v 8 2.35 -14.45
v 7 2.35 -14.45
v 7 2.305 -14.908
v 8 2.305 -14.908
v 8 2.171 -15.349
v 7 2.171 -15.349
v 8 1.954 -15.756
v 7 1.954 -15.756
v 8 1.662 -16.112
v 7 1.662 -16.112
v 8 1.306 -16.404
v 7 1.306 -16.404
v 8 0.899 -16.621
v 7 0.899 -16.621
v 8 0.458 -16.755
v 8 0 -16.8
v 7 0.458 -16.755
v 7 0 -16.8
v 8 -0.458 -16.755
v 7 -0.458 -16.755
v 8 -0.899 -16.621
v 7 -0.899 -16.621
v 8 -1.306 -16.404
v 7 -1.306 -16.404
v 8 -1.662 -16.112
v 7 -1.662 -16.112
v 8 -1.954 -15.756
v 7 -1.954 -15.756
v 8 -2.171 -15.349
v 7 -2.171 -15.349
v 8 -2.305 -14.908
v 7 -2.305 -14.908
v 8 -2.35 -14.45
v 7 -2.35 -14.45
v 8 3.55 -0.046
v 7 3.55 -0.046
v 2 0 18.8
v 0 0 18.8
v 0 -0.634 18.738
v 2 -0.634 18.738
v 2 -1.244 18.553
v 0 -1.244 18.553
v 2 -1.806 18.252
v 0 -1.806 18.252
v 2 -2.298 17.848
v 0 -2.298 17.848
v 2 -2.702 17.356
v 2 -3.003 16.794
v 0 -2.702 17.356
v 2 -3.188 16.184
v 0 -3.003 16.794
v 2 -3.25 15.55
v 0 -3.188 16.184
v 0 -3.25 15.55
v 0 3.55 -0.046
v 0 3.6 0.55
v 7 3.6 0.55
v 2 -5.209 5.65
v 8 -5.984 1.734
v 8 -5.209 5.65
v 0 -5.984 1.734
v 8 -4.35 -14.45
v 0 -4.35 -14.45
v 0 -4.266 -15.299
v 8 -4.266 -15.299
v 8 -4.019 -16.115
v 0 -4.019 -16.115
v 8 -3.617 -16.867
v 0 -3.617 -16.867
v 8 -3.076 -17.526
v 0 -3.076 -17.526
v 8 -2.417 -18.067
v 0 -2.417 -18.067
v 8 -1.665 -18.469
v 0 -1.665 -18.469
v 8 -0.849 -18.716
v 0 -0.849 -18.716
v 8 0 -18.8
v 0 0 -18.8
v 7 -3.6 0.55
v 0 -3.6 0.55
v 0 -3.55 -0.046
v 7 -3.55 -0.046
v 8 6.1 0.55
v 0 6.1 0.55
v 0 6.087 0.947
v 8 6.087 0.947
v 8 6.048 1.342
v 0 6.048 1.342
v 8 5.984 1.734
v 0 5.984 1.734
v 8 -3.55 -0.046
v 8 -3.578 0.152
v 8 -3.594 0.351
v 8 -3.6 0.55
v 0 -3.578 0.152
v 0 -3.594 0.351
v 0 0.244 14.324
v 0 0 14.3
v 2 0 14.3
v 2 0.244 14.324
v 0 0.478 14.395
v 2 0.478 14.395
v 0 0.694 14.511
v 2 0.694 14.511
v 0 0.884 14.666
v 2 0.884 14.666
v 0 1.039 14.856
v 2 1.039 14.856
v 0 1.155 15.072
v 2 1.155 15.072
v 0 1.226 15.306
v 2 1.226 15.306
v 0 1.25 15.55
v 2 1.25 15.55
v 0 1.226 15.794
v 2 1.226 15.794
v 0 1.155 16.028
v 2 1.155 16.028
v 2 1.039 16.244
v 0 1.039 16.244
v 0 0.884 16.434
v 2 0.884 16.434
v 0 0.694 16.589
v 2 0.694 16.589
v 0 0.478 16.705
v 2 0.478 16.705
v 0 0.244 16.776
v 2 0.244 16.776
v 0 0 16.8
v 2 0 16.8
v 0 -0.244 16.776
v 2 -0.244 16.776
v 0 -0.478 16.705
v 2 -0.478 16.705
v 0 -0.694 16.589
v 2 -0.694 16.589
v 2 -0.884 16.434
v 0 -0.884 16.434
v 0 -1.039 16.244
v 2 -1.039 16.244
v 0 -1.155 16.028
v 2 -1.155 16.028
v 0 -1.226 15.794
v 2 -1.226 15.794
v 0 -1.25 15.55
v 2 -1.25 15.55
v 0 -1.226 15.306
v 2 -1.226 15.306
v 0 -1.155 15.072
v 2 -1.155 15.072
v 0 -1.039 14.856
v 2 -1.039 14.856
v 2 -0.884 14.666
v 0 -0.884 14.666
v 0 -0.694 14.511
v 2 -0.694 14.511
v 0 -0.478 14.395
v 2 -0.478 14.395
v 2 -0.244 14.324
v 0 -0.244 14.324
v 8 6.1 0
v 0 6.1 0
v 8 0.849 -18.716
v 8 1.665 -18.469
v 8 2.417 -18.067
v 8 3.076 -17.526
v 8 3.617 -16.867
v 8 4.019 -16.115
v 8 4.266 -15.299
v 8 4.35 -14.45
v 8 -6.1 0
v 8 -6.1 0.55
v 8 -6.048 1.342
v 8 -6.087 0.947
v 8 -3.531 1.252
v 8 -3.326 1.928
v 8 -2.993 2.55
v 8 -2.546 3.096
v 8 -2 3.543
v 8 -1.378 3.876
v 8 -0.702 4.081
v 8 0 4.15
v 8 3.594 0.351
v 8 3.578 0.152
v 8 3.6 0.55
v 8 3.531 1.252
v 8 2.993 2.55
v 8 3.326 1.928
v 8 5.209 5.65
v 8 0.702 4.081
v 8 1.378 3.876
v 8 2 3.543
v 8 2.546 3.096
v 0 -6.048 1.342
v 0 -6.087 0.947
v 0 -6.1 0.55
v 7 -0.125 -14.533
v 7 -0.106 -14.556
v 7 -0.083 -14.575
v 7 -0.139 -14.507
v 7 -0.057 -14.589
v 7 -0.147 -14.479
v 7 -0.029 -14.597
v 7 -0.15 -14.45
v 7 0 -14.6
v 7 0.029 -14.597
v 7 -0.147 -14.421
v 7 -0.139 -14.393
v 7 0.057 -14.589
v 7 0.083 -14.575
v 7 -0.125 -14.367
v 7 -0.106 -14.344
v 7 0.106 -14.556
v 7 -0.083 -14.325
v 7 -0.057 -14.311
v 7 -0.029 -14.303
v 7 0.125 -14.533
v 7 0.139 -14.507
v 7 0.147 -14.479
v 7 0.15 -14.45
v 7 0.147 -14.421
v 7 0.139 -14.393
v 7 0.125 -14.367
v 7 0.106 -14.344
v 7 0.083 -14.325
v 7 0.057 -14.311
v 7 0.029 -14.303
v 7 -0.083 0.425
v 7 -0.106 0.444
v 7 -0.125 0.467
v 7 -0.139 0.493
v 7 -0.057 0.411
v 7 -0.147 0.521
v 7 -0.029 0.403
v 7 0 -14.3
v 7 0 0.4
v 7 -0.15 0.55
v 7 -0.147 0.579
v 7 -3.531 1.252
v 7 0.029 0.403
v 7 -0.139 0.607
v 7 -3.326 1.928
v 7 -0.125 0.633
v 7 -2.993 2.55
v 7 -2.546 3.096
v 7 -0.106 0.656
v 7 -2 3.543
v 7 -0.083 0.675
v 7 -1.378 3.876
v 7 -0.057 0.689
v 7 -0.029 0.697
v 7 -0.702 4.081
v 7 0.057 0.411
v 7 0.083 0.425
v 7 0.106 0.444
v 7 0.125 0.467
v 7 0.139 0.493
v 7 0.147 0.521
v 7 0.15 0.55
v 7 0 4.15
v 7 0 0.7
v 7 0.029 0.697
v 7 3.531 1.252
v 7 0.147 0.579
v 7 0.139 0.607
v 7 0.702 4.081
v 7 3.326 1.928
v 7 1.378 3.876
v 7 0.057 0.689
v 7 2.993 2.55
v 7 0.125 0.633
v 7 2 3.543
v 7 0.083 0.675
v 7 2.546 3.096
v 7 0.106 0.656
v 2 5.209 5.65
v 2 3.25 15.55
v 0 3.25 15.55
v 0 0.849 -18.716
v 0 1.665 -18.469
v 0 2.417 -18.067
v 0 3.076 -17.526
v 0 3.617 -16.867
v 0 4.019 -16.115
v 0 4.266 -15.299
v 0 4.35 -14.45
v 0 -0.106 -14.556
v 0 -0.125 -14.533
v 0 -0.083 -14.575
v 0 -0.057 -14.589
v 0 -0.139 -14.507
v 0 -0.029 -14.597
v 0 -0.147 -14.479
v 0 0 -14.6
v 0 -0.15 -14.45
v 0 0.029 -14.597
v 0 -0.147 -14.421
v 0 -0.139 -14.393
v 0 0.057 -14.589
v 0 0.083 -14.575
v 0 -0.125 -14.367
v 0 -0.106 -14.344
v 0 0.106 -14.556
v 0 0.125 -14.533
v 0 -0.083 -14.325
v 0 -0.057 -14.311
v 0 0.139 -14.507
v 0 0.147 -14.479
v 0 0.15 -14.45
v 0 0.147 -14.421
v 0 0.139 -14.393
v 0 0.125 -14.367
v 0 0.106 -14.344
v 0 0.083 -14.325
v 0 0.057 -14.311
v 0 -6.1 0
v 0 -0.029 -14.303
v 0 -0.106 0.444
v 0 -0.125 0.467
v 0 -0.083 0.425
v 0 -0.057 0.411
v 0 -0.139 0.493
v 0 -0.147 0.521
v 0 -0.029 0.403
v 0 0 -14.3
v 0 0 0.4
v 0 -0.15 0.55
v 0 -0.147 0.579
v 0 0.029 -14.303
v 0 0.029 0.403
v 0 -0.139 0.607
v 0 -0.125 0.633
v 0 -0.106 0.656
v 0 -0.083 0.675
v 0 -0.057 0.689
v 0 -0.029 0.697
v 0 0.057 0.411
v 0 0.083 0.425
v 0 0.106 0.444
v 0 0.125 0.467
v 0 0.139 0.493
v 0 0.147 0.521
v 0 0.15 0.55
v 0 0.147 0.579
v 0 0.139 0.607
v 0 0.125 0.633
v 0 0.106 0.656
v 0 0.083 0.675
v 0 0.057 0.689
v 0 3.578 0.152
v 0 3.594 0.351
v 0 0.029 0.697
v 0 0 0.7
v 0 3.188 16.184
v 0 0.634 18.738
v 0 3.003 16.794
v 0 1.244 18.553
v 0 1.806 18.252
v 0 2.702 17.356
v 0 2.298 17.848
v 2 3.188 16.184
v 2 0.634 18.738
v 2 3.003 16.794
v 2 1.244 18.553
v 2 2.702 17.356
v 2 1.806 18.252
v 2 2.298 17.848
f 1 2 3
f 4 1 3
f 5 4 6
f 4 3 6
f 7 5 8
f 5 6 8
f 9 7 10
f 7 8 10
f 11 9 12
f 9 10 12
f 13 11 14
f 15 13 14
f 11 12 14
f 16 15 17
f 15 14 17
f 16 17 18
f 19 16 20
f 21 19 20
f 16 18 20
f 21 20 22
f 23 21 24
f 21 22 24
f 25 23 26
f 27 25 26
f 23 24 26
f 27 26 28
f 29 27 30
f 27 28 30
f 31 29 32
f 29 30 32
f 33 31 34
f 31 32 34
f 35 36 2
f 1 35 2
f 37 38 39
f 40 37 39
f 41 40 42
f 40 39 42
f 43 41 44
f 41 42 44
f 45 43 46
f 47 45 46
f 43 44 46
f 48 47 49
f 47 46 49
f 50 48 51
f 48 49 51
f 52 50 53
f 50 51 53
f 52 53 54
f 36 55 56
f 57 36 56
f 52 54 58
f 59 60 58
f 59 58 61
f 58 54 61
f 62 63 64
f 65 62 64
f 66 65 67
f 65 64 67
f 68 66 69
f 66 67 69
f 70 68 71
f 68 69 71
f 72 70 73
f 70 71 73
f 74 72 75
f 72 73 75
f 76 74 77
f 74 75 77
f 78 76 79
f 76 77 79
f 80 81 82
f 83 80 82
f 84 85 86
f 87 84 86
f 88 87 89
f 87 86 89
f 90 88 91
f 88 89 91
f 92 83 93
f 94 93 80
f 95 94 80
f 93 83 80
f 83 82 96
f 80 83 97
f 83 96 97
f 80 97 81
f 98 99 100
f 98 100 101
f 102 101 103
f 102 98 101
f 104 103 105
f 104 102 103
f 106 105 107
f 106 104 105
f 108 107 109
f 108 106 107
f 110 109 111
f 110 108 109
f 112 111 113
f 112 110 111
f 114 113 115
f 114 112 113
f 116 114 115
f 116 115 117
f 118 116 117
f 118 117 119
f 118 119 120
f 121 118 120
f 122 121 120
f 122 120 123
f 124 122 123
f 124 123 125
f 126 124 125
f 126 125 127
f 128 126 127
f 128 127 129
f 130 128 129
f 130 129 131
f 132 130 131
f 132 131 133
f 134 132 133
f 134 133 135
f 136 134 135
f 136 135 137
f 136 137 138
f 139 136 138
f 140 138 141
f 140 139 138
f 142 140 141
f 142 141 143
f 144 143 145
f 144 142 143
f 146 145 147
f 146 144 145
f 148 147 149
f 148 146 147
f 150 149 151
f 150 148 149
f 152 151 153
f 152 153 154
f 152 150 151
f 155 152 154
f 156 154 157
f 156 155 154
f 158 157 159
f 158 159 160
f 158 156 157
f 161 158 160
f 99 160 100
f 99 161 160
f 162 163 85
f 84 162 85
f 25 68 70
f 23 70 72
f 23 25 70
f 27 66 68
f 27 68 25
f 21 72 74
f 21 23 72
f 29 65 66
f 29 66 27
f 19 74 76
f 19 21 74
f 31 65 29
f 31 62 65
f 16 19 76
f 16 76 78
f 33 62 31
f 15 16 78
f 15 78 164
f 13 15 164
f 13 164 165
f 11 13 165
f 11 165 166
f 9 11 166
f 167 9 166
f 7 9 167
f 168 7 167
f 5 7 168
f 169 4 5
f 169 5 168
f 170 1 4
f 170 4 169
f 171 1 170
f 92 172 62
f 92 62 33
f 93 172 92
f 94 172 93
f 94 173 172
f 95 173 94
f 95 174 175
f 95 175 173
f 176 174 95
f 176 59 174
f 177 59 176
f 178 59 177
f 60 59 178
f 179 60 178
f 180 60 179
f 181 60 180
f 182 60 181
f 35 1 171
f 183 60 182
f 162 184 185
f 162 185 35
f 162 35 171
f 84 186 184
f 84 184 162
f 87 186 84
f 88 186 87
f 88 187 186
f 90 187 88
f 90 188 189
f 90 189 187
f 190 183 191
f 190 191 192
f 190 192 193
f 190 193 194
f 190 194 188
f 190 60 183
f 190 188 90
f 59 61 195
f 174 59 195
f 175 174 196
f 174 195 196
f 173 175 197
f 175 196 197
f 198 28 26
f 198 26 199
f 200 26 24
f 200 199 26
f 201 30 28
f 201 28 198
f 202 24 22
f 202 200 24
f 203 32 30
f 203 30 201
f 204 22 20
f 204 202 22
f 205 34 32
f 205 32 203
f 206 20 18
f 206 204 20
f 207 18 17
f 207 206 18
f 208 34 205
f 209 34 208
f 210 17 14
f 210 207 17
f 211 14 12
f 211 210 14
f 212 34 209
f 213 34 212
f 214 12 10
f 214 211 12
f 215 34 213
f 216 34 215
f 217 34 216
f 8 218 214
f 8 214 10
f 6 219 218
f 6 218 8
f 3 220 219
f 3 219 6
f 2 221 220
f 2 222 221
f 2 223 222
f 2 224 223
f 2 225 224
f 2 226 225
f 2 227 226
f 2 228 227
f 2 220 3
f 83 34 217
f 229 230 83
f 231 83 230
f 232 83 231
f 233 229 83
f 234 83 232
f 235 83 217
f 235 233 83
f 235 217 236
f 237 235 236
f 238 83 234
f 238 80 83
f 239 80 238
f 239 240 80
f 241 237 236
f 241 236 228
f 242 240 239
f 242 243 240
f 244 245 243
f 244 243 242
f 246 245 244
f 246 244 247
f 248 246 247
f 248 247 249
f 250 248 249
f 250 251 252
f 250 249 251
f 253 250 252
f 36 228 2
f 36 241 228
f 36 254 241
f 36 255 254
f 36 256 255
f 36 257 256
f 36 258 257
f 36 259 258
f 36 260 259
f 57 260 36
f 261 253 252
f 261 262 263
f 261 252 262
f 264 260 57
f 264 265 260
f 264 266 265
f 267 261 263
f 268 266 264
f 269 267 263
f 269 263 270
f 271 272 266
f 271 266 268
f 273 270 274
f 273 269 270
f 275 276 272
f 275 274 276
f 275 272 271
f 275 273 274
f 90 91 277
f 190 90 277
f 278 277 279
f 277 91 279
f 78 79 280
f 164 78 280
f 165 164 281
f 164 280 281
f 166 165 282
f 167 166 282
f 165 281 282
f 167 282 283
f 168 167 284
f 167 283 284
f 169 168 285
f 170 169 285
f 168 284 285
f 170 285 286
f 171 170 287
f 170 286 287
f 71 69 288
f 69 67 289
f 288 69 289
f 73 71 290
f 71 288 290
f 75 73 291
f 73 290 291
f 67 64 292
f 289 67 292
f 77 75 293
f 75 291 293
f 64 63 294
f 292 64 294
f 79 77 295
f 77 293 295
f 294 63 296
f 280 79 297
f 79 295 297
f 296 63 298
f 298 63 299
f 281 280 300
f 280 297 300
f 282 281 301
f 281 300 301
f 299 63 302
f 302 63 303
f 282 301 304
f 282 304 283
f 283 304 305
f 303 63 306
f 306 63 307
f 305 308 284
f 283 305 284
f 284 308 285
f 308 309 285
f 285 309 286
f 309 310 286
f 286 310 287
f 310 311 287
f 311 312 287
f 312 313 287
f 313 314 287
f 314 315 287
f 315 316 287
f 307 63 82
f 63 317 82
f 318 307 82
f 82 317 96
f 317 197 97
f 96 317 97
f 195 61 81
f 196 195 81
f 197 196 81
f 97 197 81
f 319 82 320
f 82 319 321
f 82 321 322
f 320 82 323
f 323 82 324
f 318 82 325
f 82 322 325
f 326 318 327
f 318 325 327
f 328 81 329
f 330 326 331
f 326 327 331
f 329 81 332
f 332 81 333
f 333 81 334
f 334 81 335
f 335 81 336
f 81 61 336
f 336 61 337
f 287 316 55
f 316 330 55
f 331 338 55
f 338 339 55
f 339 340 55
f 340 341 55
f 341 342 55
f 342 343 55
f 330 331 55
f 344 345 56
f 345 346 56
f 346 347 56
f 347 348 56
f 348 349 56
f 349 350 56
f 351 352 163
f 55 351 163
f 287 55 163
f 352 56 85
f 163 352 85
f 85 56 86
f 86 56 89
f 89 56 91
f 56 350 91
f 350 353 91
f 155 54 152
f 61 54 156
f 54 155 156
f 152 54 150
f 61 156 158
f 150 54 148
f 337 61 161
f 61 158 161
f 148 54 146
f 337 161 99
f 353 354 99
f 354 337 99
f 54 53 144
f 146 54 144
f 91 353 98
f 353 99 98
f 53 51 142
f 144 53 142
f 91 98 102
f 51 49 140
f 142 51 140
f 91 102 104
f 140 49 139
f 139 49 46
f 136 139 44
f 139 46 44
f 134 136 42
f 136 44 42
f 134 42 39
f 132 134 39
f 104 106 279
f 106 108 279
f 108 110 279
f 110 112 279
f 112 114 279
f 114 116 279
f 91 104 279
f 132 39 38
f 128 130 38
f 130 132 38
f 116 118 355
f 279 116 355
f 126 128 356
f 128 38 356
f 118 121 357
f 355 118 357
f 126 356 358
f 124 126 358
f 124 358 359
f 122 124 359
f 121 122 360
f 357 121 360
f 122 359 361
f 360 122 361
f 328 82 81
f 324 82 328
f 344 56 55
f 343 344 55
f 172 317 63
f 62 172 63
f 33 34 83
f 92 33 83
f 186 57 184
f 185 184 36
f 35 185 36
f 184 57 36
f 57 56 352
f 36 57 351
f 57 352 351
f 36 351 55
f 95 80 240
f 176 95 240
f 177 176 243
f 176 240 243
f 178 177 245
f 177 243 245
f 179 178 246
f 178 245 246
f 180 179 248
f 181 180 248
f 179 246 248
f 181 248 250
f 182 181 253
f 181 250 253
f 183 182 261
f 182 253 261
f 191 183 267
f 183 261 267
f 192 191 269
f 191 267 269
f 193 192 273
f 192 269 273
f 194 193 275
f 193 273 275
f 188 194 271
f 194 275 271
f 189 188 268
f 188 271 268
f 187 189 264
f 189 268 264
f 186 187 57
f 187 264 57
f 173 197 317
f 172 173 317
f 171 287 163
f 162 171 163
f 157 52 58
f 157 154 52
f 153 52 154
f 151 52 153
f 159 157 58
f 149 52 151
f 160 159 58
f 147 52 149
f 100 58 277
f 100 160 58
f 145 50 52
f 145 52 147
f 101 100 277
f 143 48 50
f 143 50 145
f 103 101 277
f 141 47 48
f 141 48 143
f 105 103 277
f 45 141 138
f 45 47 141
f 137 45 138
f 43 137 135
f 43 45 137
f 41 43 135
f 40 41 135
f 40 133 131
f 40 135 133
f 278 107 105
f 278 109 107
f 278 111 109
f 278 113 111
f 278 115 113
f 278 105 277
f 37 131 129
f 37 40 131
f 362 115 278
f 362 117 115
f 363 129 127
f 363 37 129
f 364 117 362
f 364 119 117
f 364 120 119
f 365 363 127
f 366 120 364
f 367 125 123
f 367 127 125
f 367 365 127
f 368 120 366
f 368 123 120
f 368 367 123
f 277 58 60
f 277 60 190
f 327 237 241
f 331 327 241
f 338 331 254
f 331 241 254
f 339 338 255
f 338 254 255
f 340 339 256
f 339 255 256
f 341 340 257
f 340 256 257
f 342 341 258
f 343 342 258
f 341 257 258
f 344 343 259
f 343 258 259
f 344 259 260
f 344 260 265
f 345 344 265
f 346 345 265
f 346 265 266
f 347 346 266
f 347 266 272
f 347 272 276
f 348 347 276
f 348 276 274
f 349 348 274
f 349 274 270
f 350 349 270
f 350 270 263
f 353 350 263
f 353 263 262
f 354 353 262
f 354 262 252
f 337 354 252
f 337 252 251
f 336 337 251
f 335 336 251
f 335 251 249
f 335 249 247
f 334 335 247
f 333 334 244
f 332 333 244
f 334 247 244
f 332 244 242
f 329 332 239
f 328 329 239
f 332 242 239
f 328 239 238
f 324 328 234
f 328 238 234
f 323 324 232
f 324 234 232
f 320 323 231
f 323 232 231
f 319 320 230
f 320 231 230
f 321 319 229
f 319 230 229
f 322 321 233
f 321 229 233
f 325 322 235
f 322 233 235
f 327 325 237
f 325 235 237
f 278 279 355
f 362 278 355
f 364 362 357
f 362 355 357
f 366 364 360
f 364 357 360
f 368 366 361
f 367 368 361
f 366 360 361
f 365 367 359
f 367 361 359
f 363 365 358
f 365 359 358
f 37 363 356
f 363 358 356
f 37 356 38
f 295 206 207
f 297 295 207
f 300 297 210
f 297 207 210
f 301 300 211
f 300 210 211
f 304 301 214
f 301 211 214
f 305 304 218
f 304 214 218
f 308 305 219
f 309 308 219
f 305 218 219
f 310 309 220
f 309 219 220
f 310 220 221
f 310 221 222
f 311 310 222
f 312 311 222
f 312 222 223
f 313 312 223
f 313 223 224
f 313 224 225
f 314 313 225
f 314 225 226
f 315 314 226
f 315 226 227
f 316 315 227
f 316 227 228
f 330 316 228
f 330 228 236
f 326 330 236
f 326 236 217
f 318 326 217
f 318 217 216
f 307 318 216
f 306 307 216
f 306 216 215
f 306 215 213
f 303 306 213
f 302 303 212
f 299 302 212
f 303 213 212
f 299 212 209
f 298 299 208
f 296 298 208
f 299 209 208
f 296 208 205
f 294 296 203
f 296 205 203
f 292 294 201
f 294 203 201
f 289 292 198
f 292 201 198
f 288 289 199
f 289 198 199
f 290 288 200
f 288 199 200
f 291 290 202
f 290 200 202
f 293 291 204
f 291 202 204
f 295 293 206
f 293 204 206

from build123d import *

# Parameters (mm, degrees)
SKETCH2_R           = 1.25
BOSS_EXTRUDE1_DEPTH = 8
BOSS_EXTRUDE2_DEPTH = 7
SKETCH3_R           = 0.15
CUT_EXTRUDE1_DEPTH  = 21.967832506
CUT_EXTRUDE2_START  = -6
SKETCH4_R           = 1.25
CUT_EXTRUDE2_DEPTH  = 6


with BuildPart() as part:
    # Sketch2 → Boss-Extrude1 (new body)
    with BuildSketch(Plane.YZ):
        with BuildLine():
            ThreePointArc((-4.35, -14.45), (-3.075914484, -17.525914513), (4.1e-08, -18.8))
            ThreePointArc((4.1e-08, -18.8), (3.075914513, -17.525914484), (4.35, -14.45))
            Line((4.35, -14.45), (6.1, 0))
            Line((6.1, 0), (6.1, 0.55))
            ThreePointArc((6.1, 0.55), (6.070921356, 1.144906627), (5.983962658, 1.734141424))
            Line((5.983962658, 1.734141424), (3.25, 15.55))
            ThreePointArc((3.25, 15.55), (2.298097039, 17.848097039), (0, 18.8))
            ThreePointArc((0, 18.8), (-2.298097039, 17.848097039), (-3.25, 15.55))
            Line((-3.25, 15.55), (-5.983962658, 1.734141424))
            ThreePointArc((-5.983962658, 1.734141424), (-6.070921356, 1.144906627), (-6.1, 0.55))
            Line((-6.1, 0.55), (-6.1, 0))
            Line((-6.1, 0), (-4.35, -14.45))
        make_face()
        with BuildLine():
            Line((3.550344828, -0.045862069), (2.35, -14.45))
            ThreePointArc((2.35, -14.45), (0, -16.8), (-2.35, -14.45))
            Line((-2.35, -14.45), (-3.550344828, -0.045862069))
            ThreePointArc((-3.550344828, -0.045862069), (-3.58756473, 0.251036273), (-3.6, 0.55))
            ThreePointArc((-3.6, 0.55), (0, 4.15), (3.6, 0.55))
            ThreePointArc((3.6, 0.55), (3.58756473, 0.251036273), (3.550344828, -0.045862069))
        make_face(mode=Mode.SUBTRACT)
        with Locations((0, 15.55)):
            Circle(SKETCH2_R, mode=Mode.SUBTRACT)
    extrude(amount=BOSS_EXTRUDE1_DEPTH)

    # Sketch2<3> → Boss-Extrude2 (add)
    with BuildSketch(Plane.YZ):
        with BuildLine():
            ThreePointArc((-2.35, -14.45), (0, -16.8), (2.35, -14.45))
            Line((2.35, -14.45), (3.550344828, -0.045862069))
            Line((3.550344828, -0.045862069), (3.6, 0.55))
            ThreePointArc((3.6, 0.55), (0, 4.15), (-3.6, 0.55))
            Line((-3.6, 0.55), (-3.550344828, -0.045862069))
            Line((-3.550344828, -0.045862069), (-2.35, -14.45))
        make_face()
    extrude(amount=BOSS_EXTRUDE2_DEPTH)

    # Sketch3 → Cut-Extrude1 (cut, through all)
    with BuildSketch(Plane.YZ.offset(7)):
        with Locations((0, 0.55)):
            Circle(SKETCH3_R)
        with Locations((0, -14.45)):
            Circle(SKETCH3_R)
    extrude(amount=-CUT_EXTRUDE1_DEPTH, mode=Mode.SUBTRACT)

    # Sketch4 → Cut-Extrude2 (cut)
    with BuildSketch(Plane.YZ.offset(8).offset(CUT_EXTRUDE2_START)):
        with BuildLine():
            Line((-5.209069729, 5.65), (5.209069729, 5.65))
            Line((5.209069729, 5.65), (3.25, 15.55))
            ThreePointArc((3.25, 15.55), (0, 18.8), (-3.25, 15.55))
            Line((-3.25, 15.55), (-5.209069729, 5.65))
        make_face()
        with Locations((0, 15.55)):
            Circle(SKETCH4_R, mode=Mode.SUBTRACT)
    extrude(amount=CUT_EXTRUDE2_DEPTH, mode=Mode.SUBTRACT)


solid = part.part
